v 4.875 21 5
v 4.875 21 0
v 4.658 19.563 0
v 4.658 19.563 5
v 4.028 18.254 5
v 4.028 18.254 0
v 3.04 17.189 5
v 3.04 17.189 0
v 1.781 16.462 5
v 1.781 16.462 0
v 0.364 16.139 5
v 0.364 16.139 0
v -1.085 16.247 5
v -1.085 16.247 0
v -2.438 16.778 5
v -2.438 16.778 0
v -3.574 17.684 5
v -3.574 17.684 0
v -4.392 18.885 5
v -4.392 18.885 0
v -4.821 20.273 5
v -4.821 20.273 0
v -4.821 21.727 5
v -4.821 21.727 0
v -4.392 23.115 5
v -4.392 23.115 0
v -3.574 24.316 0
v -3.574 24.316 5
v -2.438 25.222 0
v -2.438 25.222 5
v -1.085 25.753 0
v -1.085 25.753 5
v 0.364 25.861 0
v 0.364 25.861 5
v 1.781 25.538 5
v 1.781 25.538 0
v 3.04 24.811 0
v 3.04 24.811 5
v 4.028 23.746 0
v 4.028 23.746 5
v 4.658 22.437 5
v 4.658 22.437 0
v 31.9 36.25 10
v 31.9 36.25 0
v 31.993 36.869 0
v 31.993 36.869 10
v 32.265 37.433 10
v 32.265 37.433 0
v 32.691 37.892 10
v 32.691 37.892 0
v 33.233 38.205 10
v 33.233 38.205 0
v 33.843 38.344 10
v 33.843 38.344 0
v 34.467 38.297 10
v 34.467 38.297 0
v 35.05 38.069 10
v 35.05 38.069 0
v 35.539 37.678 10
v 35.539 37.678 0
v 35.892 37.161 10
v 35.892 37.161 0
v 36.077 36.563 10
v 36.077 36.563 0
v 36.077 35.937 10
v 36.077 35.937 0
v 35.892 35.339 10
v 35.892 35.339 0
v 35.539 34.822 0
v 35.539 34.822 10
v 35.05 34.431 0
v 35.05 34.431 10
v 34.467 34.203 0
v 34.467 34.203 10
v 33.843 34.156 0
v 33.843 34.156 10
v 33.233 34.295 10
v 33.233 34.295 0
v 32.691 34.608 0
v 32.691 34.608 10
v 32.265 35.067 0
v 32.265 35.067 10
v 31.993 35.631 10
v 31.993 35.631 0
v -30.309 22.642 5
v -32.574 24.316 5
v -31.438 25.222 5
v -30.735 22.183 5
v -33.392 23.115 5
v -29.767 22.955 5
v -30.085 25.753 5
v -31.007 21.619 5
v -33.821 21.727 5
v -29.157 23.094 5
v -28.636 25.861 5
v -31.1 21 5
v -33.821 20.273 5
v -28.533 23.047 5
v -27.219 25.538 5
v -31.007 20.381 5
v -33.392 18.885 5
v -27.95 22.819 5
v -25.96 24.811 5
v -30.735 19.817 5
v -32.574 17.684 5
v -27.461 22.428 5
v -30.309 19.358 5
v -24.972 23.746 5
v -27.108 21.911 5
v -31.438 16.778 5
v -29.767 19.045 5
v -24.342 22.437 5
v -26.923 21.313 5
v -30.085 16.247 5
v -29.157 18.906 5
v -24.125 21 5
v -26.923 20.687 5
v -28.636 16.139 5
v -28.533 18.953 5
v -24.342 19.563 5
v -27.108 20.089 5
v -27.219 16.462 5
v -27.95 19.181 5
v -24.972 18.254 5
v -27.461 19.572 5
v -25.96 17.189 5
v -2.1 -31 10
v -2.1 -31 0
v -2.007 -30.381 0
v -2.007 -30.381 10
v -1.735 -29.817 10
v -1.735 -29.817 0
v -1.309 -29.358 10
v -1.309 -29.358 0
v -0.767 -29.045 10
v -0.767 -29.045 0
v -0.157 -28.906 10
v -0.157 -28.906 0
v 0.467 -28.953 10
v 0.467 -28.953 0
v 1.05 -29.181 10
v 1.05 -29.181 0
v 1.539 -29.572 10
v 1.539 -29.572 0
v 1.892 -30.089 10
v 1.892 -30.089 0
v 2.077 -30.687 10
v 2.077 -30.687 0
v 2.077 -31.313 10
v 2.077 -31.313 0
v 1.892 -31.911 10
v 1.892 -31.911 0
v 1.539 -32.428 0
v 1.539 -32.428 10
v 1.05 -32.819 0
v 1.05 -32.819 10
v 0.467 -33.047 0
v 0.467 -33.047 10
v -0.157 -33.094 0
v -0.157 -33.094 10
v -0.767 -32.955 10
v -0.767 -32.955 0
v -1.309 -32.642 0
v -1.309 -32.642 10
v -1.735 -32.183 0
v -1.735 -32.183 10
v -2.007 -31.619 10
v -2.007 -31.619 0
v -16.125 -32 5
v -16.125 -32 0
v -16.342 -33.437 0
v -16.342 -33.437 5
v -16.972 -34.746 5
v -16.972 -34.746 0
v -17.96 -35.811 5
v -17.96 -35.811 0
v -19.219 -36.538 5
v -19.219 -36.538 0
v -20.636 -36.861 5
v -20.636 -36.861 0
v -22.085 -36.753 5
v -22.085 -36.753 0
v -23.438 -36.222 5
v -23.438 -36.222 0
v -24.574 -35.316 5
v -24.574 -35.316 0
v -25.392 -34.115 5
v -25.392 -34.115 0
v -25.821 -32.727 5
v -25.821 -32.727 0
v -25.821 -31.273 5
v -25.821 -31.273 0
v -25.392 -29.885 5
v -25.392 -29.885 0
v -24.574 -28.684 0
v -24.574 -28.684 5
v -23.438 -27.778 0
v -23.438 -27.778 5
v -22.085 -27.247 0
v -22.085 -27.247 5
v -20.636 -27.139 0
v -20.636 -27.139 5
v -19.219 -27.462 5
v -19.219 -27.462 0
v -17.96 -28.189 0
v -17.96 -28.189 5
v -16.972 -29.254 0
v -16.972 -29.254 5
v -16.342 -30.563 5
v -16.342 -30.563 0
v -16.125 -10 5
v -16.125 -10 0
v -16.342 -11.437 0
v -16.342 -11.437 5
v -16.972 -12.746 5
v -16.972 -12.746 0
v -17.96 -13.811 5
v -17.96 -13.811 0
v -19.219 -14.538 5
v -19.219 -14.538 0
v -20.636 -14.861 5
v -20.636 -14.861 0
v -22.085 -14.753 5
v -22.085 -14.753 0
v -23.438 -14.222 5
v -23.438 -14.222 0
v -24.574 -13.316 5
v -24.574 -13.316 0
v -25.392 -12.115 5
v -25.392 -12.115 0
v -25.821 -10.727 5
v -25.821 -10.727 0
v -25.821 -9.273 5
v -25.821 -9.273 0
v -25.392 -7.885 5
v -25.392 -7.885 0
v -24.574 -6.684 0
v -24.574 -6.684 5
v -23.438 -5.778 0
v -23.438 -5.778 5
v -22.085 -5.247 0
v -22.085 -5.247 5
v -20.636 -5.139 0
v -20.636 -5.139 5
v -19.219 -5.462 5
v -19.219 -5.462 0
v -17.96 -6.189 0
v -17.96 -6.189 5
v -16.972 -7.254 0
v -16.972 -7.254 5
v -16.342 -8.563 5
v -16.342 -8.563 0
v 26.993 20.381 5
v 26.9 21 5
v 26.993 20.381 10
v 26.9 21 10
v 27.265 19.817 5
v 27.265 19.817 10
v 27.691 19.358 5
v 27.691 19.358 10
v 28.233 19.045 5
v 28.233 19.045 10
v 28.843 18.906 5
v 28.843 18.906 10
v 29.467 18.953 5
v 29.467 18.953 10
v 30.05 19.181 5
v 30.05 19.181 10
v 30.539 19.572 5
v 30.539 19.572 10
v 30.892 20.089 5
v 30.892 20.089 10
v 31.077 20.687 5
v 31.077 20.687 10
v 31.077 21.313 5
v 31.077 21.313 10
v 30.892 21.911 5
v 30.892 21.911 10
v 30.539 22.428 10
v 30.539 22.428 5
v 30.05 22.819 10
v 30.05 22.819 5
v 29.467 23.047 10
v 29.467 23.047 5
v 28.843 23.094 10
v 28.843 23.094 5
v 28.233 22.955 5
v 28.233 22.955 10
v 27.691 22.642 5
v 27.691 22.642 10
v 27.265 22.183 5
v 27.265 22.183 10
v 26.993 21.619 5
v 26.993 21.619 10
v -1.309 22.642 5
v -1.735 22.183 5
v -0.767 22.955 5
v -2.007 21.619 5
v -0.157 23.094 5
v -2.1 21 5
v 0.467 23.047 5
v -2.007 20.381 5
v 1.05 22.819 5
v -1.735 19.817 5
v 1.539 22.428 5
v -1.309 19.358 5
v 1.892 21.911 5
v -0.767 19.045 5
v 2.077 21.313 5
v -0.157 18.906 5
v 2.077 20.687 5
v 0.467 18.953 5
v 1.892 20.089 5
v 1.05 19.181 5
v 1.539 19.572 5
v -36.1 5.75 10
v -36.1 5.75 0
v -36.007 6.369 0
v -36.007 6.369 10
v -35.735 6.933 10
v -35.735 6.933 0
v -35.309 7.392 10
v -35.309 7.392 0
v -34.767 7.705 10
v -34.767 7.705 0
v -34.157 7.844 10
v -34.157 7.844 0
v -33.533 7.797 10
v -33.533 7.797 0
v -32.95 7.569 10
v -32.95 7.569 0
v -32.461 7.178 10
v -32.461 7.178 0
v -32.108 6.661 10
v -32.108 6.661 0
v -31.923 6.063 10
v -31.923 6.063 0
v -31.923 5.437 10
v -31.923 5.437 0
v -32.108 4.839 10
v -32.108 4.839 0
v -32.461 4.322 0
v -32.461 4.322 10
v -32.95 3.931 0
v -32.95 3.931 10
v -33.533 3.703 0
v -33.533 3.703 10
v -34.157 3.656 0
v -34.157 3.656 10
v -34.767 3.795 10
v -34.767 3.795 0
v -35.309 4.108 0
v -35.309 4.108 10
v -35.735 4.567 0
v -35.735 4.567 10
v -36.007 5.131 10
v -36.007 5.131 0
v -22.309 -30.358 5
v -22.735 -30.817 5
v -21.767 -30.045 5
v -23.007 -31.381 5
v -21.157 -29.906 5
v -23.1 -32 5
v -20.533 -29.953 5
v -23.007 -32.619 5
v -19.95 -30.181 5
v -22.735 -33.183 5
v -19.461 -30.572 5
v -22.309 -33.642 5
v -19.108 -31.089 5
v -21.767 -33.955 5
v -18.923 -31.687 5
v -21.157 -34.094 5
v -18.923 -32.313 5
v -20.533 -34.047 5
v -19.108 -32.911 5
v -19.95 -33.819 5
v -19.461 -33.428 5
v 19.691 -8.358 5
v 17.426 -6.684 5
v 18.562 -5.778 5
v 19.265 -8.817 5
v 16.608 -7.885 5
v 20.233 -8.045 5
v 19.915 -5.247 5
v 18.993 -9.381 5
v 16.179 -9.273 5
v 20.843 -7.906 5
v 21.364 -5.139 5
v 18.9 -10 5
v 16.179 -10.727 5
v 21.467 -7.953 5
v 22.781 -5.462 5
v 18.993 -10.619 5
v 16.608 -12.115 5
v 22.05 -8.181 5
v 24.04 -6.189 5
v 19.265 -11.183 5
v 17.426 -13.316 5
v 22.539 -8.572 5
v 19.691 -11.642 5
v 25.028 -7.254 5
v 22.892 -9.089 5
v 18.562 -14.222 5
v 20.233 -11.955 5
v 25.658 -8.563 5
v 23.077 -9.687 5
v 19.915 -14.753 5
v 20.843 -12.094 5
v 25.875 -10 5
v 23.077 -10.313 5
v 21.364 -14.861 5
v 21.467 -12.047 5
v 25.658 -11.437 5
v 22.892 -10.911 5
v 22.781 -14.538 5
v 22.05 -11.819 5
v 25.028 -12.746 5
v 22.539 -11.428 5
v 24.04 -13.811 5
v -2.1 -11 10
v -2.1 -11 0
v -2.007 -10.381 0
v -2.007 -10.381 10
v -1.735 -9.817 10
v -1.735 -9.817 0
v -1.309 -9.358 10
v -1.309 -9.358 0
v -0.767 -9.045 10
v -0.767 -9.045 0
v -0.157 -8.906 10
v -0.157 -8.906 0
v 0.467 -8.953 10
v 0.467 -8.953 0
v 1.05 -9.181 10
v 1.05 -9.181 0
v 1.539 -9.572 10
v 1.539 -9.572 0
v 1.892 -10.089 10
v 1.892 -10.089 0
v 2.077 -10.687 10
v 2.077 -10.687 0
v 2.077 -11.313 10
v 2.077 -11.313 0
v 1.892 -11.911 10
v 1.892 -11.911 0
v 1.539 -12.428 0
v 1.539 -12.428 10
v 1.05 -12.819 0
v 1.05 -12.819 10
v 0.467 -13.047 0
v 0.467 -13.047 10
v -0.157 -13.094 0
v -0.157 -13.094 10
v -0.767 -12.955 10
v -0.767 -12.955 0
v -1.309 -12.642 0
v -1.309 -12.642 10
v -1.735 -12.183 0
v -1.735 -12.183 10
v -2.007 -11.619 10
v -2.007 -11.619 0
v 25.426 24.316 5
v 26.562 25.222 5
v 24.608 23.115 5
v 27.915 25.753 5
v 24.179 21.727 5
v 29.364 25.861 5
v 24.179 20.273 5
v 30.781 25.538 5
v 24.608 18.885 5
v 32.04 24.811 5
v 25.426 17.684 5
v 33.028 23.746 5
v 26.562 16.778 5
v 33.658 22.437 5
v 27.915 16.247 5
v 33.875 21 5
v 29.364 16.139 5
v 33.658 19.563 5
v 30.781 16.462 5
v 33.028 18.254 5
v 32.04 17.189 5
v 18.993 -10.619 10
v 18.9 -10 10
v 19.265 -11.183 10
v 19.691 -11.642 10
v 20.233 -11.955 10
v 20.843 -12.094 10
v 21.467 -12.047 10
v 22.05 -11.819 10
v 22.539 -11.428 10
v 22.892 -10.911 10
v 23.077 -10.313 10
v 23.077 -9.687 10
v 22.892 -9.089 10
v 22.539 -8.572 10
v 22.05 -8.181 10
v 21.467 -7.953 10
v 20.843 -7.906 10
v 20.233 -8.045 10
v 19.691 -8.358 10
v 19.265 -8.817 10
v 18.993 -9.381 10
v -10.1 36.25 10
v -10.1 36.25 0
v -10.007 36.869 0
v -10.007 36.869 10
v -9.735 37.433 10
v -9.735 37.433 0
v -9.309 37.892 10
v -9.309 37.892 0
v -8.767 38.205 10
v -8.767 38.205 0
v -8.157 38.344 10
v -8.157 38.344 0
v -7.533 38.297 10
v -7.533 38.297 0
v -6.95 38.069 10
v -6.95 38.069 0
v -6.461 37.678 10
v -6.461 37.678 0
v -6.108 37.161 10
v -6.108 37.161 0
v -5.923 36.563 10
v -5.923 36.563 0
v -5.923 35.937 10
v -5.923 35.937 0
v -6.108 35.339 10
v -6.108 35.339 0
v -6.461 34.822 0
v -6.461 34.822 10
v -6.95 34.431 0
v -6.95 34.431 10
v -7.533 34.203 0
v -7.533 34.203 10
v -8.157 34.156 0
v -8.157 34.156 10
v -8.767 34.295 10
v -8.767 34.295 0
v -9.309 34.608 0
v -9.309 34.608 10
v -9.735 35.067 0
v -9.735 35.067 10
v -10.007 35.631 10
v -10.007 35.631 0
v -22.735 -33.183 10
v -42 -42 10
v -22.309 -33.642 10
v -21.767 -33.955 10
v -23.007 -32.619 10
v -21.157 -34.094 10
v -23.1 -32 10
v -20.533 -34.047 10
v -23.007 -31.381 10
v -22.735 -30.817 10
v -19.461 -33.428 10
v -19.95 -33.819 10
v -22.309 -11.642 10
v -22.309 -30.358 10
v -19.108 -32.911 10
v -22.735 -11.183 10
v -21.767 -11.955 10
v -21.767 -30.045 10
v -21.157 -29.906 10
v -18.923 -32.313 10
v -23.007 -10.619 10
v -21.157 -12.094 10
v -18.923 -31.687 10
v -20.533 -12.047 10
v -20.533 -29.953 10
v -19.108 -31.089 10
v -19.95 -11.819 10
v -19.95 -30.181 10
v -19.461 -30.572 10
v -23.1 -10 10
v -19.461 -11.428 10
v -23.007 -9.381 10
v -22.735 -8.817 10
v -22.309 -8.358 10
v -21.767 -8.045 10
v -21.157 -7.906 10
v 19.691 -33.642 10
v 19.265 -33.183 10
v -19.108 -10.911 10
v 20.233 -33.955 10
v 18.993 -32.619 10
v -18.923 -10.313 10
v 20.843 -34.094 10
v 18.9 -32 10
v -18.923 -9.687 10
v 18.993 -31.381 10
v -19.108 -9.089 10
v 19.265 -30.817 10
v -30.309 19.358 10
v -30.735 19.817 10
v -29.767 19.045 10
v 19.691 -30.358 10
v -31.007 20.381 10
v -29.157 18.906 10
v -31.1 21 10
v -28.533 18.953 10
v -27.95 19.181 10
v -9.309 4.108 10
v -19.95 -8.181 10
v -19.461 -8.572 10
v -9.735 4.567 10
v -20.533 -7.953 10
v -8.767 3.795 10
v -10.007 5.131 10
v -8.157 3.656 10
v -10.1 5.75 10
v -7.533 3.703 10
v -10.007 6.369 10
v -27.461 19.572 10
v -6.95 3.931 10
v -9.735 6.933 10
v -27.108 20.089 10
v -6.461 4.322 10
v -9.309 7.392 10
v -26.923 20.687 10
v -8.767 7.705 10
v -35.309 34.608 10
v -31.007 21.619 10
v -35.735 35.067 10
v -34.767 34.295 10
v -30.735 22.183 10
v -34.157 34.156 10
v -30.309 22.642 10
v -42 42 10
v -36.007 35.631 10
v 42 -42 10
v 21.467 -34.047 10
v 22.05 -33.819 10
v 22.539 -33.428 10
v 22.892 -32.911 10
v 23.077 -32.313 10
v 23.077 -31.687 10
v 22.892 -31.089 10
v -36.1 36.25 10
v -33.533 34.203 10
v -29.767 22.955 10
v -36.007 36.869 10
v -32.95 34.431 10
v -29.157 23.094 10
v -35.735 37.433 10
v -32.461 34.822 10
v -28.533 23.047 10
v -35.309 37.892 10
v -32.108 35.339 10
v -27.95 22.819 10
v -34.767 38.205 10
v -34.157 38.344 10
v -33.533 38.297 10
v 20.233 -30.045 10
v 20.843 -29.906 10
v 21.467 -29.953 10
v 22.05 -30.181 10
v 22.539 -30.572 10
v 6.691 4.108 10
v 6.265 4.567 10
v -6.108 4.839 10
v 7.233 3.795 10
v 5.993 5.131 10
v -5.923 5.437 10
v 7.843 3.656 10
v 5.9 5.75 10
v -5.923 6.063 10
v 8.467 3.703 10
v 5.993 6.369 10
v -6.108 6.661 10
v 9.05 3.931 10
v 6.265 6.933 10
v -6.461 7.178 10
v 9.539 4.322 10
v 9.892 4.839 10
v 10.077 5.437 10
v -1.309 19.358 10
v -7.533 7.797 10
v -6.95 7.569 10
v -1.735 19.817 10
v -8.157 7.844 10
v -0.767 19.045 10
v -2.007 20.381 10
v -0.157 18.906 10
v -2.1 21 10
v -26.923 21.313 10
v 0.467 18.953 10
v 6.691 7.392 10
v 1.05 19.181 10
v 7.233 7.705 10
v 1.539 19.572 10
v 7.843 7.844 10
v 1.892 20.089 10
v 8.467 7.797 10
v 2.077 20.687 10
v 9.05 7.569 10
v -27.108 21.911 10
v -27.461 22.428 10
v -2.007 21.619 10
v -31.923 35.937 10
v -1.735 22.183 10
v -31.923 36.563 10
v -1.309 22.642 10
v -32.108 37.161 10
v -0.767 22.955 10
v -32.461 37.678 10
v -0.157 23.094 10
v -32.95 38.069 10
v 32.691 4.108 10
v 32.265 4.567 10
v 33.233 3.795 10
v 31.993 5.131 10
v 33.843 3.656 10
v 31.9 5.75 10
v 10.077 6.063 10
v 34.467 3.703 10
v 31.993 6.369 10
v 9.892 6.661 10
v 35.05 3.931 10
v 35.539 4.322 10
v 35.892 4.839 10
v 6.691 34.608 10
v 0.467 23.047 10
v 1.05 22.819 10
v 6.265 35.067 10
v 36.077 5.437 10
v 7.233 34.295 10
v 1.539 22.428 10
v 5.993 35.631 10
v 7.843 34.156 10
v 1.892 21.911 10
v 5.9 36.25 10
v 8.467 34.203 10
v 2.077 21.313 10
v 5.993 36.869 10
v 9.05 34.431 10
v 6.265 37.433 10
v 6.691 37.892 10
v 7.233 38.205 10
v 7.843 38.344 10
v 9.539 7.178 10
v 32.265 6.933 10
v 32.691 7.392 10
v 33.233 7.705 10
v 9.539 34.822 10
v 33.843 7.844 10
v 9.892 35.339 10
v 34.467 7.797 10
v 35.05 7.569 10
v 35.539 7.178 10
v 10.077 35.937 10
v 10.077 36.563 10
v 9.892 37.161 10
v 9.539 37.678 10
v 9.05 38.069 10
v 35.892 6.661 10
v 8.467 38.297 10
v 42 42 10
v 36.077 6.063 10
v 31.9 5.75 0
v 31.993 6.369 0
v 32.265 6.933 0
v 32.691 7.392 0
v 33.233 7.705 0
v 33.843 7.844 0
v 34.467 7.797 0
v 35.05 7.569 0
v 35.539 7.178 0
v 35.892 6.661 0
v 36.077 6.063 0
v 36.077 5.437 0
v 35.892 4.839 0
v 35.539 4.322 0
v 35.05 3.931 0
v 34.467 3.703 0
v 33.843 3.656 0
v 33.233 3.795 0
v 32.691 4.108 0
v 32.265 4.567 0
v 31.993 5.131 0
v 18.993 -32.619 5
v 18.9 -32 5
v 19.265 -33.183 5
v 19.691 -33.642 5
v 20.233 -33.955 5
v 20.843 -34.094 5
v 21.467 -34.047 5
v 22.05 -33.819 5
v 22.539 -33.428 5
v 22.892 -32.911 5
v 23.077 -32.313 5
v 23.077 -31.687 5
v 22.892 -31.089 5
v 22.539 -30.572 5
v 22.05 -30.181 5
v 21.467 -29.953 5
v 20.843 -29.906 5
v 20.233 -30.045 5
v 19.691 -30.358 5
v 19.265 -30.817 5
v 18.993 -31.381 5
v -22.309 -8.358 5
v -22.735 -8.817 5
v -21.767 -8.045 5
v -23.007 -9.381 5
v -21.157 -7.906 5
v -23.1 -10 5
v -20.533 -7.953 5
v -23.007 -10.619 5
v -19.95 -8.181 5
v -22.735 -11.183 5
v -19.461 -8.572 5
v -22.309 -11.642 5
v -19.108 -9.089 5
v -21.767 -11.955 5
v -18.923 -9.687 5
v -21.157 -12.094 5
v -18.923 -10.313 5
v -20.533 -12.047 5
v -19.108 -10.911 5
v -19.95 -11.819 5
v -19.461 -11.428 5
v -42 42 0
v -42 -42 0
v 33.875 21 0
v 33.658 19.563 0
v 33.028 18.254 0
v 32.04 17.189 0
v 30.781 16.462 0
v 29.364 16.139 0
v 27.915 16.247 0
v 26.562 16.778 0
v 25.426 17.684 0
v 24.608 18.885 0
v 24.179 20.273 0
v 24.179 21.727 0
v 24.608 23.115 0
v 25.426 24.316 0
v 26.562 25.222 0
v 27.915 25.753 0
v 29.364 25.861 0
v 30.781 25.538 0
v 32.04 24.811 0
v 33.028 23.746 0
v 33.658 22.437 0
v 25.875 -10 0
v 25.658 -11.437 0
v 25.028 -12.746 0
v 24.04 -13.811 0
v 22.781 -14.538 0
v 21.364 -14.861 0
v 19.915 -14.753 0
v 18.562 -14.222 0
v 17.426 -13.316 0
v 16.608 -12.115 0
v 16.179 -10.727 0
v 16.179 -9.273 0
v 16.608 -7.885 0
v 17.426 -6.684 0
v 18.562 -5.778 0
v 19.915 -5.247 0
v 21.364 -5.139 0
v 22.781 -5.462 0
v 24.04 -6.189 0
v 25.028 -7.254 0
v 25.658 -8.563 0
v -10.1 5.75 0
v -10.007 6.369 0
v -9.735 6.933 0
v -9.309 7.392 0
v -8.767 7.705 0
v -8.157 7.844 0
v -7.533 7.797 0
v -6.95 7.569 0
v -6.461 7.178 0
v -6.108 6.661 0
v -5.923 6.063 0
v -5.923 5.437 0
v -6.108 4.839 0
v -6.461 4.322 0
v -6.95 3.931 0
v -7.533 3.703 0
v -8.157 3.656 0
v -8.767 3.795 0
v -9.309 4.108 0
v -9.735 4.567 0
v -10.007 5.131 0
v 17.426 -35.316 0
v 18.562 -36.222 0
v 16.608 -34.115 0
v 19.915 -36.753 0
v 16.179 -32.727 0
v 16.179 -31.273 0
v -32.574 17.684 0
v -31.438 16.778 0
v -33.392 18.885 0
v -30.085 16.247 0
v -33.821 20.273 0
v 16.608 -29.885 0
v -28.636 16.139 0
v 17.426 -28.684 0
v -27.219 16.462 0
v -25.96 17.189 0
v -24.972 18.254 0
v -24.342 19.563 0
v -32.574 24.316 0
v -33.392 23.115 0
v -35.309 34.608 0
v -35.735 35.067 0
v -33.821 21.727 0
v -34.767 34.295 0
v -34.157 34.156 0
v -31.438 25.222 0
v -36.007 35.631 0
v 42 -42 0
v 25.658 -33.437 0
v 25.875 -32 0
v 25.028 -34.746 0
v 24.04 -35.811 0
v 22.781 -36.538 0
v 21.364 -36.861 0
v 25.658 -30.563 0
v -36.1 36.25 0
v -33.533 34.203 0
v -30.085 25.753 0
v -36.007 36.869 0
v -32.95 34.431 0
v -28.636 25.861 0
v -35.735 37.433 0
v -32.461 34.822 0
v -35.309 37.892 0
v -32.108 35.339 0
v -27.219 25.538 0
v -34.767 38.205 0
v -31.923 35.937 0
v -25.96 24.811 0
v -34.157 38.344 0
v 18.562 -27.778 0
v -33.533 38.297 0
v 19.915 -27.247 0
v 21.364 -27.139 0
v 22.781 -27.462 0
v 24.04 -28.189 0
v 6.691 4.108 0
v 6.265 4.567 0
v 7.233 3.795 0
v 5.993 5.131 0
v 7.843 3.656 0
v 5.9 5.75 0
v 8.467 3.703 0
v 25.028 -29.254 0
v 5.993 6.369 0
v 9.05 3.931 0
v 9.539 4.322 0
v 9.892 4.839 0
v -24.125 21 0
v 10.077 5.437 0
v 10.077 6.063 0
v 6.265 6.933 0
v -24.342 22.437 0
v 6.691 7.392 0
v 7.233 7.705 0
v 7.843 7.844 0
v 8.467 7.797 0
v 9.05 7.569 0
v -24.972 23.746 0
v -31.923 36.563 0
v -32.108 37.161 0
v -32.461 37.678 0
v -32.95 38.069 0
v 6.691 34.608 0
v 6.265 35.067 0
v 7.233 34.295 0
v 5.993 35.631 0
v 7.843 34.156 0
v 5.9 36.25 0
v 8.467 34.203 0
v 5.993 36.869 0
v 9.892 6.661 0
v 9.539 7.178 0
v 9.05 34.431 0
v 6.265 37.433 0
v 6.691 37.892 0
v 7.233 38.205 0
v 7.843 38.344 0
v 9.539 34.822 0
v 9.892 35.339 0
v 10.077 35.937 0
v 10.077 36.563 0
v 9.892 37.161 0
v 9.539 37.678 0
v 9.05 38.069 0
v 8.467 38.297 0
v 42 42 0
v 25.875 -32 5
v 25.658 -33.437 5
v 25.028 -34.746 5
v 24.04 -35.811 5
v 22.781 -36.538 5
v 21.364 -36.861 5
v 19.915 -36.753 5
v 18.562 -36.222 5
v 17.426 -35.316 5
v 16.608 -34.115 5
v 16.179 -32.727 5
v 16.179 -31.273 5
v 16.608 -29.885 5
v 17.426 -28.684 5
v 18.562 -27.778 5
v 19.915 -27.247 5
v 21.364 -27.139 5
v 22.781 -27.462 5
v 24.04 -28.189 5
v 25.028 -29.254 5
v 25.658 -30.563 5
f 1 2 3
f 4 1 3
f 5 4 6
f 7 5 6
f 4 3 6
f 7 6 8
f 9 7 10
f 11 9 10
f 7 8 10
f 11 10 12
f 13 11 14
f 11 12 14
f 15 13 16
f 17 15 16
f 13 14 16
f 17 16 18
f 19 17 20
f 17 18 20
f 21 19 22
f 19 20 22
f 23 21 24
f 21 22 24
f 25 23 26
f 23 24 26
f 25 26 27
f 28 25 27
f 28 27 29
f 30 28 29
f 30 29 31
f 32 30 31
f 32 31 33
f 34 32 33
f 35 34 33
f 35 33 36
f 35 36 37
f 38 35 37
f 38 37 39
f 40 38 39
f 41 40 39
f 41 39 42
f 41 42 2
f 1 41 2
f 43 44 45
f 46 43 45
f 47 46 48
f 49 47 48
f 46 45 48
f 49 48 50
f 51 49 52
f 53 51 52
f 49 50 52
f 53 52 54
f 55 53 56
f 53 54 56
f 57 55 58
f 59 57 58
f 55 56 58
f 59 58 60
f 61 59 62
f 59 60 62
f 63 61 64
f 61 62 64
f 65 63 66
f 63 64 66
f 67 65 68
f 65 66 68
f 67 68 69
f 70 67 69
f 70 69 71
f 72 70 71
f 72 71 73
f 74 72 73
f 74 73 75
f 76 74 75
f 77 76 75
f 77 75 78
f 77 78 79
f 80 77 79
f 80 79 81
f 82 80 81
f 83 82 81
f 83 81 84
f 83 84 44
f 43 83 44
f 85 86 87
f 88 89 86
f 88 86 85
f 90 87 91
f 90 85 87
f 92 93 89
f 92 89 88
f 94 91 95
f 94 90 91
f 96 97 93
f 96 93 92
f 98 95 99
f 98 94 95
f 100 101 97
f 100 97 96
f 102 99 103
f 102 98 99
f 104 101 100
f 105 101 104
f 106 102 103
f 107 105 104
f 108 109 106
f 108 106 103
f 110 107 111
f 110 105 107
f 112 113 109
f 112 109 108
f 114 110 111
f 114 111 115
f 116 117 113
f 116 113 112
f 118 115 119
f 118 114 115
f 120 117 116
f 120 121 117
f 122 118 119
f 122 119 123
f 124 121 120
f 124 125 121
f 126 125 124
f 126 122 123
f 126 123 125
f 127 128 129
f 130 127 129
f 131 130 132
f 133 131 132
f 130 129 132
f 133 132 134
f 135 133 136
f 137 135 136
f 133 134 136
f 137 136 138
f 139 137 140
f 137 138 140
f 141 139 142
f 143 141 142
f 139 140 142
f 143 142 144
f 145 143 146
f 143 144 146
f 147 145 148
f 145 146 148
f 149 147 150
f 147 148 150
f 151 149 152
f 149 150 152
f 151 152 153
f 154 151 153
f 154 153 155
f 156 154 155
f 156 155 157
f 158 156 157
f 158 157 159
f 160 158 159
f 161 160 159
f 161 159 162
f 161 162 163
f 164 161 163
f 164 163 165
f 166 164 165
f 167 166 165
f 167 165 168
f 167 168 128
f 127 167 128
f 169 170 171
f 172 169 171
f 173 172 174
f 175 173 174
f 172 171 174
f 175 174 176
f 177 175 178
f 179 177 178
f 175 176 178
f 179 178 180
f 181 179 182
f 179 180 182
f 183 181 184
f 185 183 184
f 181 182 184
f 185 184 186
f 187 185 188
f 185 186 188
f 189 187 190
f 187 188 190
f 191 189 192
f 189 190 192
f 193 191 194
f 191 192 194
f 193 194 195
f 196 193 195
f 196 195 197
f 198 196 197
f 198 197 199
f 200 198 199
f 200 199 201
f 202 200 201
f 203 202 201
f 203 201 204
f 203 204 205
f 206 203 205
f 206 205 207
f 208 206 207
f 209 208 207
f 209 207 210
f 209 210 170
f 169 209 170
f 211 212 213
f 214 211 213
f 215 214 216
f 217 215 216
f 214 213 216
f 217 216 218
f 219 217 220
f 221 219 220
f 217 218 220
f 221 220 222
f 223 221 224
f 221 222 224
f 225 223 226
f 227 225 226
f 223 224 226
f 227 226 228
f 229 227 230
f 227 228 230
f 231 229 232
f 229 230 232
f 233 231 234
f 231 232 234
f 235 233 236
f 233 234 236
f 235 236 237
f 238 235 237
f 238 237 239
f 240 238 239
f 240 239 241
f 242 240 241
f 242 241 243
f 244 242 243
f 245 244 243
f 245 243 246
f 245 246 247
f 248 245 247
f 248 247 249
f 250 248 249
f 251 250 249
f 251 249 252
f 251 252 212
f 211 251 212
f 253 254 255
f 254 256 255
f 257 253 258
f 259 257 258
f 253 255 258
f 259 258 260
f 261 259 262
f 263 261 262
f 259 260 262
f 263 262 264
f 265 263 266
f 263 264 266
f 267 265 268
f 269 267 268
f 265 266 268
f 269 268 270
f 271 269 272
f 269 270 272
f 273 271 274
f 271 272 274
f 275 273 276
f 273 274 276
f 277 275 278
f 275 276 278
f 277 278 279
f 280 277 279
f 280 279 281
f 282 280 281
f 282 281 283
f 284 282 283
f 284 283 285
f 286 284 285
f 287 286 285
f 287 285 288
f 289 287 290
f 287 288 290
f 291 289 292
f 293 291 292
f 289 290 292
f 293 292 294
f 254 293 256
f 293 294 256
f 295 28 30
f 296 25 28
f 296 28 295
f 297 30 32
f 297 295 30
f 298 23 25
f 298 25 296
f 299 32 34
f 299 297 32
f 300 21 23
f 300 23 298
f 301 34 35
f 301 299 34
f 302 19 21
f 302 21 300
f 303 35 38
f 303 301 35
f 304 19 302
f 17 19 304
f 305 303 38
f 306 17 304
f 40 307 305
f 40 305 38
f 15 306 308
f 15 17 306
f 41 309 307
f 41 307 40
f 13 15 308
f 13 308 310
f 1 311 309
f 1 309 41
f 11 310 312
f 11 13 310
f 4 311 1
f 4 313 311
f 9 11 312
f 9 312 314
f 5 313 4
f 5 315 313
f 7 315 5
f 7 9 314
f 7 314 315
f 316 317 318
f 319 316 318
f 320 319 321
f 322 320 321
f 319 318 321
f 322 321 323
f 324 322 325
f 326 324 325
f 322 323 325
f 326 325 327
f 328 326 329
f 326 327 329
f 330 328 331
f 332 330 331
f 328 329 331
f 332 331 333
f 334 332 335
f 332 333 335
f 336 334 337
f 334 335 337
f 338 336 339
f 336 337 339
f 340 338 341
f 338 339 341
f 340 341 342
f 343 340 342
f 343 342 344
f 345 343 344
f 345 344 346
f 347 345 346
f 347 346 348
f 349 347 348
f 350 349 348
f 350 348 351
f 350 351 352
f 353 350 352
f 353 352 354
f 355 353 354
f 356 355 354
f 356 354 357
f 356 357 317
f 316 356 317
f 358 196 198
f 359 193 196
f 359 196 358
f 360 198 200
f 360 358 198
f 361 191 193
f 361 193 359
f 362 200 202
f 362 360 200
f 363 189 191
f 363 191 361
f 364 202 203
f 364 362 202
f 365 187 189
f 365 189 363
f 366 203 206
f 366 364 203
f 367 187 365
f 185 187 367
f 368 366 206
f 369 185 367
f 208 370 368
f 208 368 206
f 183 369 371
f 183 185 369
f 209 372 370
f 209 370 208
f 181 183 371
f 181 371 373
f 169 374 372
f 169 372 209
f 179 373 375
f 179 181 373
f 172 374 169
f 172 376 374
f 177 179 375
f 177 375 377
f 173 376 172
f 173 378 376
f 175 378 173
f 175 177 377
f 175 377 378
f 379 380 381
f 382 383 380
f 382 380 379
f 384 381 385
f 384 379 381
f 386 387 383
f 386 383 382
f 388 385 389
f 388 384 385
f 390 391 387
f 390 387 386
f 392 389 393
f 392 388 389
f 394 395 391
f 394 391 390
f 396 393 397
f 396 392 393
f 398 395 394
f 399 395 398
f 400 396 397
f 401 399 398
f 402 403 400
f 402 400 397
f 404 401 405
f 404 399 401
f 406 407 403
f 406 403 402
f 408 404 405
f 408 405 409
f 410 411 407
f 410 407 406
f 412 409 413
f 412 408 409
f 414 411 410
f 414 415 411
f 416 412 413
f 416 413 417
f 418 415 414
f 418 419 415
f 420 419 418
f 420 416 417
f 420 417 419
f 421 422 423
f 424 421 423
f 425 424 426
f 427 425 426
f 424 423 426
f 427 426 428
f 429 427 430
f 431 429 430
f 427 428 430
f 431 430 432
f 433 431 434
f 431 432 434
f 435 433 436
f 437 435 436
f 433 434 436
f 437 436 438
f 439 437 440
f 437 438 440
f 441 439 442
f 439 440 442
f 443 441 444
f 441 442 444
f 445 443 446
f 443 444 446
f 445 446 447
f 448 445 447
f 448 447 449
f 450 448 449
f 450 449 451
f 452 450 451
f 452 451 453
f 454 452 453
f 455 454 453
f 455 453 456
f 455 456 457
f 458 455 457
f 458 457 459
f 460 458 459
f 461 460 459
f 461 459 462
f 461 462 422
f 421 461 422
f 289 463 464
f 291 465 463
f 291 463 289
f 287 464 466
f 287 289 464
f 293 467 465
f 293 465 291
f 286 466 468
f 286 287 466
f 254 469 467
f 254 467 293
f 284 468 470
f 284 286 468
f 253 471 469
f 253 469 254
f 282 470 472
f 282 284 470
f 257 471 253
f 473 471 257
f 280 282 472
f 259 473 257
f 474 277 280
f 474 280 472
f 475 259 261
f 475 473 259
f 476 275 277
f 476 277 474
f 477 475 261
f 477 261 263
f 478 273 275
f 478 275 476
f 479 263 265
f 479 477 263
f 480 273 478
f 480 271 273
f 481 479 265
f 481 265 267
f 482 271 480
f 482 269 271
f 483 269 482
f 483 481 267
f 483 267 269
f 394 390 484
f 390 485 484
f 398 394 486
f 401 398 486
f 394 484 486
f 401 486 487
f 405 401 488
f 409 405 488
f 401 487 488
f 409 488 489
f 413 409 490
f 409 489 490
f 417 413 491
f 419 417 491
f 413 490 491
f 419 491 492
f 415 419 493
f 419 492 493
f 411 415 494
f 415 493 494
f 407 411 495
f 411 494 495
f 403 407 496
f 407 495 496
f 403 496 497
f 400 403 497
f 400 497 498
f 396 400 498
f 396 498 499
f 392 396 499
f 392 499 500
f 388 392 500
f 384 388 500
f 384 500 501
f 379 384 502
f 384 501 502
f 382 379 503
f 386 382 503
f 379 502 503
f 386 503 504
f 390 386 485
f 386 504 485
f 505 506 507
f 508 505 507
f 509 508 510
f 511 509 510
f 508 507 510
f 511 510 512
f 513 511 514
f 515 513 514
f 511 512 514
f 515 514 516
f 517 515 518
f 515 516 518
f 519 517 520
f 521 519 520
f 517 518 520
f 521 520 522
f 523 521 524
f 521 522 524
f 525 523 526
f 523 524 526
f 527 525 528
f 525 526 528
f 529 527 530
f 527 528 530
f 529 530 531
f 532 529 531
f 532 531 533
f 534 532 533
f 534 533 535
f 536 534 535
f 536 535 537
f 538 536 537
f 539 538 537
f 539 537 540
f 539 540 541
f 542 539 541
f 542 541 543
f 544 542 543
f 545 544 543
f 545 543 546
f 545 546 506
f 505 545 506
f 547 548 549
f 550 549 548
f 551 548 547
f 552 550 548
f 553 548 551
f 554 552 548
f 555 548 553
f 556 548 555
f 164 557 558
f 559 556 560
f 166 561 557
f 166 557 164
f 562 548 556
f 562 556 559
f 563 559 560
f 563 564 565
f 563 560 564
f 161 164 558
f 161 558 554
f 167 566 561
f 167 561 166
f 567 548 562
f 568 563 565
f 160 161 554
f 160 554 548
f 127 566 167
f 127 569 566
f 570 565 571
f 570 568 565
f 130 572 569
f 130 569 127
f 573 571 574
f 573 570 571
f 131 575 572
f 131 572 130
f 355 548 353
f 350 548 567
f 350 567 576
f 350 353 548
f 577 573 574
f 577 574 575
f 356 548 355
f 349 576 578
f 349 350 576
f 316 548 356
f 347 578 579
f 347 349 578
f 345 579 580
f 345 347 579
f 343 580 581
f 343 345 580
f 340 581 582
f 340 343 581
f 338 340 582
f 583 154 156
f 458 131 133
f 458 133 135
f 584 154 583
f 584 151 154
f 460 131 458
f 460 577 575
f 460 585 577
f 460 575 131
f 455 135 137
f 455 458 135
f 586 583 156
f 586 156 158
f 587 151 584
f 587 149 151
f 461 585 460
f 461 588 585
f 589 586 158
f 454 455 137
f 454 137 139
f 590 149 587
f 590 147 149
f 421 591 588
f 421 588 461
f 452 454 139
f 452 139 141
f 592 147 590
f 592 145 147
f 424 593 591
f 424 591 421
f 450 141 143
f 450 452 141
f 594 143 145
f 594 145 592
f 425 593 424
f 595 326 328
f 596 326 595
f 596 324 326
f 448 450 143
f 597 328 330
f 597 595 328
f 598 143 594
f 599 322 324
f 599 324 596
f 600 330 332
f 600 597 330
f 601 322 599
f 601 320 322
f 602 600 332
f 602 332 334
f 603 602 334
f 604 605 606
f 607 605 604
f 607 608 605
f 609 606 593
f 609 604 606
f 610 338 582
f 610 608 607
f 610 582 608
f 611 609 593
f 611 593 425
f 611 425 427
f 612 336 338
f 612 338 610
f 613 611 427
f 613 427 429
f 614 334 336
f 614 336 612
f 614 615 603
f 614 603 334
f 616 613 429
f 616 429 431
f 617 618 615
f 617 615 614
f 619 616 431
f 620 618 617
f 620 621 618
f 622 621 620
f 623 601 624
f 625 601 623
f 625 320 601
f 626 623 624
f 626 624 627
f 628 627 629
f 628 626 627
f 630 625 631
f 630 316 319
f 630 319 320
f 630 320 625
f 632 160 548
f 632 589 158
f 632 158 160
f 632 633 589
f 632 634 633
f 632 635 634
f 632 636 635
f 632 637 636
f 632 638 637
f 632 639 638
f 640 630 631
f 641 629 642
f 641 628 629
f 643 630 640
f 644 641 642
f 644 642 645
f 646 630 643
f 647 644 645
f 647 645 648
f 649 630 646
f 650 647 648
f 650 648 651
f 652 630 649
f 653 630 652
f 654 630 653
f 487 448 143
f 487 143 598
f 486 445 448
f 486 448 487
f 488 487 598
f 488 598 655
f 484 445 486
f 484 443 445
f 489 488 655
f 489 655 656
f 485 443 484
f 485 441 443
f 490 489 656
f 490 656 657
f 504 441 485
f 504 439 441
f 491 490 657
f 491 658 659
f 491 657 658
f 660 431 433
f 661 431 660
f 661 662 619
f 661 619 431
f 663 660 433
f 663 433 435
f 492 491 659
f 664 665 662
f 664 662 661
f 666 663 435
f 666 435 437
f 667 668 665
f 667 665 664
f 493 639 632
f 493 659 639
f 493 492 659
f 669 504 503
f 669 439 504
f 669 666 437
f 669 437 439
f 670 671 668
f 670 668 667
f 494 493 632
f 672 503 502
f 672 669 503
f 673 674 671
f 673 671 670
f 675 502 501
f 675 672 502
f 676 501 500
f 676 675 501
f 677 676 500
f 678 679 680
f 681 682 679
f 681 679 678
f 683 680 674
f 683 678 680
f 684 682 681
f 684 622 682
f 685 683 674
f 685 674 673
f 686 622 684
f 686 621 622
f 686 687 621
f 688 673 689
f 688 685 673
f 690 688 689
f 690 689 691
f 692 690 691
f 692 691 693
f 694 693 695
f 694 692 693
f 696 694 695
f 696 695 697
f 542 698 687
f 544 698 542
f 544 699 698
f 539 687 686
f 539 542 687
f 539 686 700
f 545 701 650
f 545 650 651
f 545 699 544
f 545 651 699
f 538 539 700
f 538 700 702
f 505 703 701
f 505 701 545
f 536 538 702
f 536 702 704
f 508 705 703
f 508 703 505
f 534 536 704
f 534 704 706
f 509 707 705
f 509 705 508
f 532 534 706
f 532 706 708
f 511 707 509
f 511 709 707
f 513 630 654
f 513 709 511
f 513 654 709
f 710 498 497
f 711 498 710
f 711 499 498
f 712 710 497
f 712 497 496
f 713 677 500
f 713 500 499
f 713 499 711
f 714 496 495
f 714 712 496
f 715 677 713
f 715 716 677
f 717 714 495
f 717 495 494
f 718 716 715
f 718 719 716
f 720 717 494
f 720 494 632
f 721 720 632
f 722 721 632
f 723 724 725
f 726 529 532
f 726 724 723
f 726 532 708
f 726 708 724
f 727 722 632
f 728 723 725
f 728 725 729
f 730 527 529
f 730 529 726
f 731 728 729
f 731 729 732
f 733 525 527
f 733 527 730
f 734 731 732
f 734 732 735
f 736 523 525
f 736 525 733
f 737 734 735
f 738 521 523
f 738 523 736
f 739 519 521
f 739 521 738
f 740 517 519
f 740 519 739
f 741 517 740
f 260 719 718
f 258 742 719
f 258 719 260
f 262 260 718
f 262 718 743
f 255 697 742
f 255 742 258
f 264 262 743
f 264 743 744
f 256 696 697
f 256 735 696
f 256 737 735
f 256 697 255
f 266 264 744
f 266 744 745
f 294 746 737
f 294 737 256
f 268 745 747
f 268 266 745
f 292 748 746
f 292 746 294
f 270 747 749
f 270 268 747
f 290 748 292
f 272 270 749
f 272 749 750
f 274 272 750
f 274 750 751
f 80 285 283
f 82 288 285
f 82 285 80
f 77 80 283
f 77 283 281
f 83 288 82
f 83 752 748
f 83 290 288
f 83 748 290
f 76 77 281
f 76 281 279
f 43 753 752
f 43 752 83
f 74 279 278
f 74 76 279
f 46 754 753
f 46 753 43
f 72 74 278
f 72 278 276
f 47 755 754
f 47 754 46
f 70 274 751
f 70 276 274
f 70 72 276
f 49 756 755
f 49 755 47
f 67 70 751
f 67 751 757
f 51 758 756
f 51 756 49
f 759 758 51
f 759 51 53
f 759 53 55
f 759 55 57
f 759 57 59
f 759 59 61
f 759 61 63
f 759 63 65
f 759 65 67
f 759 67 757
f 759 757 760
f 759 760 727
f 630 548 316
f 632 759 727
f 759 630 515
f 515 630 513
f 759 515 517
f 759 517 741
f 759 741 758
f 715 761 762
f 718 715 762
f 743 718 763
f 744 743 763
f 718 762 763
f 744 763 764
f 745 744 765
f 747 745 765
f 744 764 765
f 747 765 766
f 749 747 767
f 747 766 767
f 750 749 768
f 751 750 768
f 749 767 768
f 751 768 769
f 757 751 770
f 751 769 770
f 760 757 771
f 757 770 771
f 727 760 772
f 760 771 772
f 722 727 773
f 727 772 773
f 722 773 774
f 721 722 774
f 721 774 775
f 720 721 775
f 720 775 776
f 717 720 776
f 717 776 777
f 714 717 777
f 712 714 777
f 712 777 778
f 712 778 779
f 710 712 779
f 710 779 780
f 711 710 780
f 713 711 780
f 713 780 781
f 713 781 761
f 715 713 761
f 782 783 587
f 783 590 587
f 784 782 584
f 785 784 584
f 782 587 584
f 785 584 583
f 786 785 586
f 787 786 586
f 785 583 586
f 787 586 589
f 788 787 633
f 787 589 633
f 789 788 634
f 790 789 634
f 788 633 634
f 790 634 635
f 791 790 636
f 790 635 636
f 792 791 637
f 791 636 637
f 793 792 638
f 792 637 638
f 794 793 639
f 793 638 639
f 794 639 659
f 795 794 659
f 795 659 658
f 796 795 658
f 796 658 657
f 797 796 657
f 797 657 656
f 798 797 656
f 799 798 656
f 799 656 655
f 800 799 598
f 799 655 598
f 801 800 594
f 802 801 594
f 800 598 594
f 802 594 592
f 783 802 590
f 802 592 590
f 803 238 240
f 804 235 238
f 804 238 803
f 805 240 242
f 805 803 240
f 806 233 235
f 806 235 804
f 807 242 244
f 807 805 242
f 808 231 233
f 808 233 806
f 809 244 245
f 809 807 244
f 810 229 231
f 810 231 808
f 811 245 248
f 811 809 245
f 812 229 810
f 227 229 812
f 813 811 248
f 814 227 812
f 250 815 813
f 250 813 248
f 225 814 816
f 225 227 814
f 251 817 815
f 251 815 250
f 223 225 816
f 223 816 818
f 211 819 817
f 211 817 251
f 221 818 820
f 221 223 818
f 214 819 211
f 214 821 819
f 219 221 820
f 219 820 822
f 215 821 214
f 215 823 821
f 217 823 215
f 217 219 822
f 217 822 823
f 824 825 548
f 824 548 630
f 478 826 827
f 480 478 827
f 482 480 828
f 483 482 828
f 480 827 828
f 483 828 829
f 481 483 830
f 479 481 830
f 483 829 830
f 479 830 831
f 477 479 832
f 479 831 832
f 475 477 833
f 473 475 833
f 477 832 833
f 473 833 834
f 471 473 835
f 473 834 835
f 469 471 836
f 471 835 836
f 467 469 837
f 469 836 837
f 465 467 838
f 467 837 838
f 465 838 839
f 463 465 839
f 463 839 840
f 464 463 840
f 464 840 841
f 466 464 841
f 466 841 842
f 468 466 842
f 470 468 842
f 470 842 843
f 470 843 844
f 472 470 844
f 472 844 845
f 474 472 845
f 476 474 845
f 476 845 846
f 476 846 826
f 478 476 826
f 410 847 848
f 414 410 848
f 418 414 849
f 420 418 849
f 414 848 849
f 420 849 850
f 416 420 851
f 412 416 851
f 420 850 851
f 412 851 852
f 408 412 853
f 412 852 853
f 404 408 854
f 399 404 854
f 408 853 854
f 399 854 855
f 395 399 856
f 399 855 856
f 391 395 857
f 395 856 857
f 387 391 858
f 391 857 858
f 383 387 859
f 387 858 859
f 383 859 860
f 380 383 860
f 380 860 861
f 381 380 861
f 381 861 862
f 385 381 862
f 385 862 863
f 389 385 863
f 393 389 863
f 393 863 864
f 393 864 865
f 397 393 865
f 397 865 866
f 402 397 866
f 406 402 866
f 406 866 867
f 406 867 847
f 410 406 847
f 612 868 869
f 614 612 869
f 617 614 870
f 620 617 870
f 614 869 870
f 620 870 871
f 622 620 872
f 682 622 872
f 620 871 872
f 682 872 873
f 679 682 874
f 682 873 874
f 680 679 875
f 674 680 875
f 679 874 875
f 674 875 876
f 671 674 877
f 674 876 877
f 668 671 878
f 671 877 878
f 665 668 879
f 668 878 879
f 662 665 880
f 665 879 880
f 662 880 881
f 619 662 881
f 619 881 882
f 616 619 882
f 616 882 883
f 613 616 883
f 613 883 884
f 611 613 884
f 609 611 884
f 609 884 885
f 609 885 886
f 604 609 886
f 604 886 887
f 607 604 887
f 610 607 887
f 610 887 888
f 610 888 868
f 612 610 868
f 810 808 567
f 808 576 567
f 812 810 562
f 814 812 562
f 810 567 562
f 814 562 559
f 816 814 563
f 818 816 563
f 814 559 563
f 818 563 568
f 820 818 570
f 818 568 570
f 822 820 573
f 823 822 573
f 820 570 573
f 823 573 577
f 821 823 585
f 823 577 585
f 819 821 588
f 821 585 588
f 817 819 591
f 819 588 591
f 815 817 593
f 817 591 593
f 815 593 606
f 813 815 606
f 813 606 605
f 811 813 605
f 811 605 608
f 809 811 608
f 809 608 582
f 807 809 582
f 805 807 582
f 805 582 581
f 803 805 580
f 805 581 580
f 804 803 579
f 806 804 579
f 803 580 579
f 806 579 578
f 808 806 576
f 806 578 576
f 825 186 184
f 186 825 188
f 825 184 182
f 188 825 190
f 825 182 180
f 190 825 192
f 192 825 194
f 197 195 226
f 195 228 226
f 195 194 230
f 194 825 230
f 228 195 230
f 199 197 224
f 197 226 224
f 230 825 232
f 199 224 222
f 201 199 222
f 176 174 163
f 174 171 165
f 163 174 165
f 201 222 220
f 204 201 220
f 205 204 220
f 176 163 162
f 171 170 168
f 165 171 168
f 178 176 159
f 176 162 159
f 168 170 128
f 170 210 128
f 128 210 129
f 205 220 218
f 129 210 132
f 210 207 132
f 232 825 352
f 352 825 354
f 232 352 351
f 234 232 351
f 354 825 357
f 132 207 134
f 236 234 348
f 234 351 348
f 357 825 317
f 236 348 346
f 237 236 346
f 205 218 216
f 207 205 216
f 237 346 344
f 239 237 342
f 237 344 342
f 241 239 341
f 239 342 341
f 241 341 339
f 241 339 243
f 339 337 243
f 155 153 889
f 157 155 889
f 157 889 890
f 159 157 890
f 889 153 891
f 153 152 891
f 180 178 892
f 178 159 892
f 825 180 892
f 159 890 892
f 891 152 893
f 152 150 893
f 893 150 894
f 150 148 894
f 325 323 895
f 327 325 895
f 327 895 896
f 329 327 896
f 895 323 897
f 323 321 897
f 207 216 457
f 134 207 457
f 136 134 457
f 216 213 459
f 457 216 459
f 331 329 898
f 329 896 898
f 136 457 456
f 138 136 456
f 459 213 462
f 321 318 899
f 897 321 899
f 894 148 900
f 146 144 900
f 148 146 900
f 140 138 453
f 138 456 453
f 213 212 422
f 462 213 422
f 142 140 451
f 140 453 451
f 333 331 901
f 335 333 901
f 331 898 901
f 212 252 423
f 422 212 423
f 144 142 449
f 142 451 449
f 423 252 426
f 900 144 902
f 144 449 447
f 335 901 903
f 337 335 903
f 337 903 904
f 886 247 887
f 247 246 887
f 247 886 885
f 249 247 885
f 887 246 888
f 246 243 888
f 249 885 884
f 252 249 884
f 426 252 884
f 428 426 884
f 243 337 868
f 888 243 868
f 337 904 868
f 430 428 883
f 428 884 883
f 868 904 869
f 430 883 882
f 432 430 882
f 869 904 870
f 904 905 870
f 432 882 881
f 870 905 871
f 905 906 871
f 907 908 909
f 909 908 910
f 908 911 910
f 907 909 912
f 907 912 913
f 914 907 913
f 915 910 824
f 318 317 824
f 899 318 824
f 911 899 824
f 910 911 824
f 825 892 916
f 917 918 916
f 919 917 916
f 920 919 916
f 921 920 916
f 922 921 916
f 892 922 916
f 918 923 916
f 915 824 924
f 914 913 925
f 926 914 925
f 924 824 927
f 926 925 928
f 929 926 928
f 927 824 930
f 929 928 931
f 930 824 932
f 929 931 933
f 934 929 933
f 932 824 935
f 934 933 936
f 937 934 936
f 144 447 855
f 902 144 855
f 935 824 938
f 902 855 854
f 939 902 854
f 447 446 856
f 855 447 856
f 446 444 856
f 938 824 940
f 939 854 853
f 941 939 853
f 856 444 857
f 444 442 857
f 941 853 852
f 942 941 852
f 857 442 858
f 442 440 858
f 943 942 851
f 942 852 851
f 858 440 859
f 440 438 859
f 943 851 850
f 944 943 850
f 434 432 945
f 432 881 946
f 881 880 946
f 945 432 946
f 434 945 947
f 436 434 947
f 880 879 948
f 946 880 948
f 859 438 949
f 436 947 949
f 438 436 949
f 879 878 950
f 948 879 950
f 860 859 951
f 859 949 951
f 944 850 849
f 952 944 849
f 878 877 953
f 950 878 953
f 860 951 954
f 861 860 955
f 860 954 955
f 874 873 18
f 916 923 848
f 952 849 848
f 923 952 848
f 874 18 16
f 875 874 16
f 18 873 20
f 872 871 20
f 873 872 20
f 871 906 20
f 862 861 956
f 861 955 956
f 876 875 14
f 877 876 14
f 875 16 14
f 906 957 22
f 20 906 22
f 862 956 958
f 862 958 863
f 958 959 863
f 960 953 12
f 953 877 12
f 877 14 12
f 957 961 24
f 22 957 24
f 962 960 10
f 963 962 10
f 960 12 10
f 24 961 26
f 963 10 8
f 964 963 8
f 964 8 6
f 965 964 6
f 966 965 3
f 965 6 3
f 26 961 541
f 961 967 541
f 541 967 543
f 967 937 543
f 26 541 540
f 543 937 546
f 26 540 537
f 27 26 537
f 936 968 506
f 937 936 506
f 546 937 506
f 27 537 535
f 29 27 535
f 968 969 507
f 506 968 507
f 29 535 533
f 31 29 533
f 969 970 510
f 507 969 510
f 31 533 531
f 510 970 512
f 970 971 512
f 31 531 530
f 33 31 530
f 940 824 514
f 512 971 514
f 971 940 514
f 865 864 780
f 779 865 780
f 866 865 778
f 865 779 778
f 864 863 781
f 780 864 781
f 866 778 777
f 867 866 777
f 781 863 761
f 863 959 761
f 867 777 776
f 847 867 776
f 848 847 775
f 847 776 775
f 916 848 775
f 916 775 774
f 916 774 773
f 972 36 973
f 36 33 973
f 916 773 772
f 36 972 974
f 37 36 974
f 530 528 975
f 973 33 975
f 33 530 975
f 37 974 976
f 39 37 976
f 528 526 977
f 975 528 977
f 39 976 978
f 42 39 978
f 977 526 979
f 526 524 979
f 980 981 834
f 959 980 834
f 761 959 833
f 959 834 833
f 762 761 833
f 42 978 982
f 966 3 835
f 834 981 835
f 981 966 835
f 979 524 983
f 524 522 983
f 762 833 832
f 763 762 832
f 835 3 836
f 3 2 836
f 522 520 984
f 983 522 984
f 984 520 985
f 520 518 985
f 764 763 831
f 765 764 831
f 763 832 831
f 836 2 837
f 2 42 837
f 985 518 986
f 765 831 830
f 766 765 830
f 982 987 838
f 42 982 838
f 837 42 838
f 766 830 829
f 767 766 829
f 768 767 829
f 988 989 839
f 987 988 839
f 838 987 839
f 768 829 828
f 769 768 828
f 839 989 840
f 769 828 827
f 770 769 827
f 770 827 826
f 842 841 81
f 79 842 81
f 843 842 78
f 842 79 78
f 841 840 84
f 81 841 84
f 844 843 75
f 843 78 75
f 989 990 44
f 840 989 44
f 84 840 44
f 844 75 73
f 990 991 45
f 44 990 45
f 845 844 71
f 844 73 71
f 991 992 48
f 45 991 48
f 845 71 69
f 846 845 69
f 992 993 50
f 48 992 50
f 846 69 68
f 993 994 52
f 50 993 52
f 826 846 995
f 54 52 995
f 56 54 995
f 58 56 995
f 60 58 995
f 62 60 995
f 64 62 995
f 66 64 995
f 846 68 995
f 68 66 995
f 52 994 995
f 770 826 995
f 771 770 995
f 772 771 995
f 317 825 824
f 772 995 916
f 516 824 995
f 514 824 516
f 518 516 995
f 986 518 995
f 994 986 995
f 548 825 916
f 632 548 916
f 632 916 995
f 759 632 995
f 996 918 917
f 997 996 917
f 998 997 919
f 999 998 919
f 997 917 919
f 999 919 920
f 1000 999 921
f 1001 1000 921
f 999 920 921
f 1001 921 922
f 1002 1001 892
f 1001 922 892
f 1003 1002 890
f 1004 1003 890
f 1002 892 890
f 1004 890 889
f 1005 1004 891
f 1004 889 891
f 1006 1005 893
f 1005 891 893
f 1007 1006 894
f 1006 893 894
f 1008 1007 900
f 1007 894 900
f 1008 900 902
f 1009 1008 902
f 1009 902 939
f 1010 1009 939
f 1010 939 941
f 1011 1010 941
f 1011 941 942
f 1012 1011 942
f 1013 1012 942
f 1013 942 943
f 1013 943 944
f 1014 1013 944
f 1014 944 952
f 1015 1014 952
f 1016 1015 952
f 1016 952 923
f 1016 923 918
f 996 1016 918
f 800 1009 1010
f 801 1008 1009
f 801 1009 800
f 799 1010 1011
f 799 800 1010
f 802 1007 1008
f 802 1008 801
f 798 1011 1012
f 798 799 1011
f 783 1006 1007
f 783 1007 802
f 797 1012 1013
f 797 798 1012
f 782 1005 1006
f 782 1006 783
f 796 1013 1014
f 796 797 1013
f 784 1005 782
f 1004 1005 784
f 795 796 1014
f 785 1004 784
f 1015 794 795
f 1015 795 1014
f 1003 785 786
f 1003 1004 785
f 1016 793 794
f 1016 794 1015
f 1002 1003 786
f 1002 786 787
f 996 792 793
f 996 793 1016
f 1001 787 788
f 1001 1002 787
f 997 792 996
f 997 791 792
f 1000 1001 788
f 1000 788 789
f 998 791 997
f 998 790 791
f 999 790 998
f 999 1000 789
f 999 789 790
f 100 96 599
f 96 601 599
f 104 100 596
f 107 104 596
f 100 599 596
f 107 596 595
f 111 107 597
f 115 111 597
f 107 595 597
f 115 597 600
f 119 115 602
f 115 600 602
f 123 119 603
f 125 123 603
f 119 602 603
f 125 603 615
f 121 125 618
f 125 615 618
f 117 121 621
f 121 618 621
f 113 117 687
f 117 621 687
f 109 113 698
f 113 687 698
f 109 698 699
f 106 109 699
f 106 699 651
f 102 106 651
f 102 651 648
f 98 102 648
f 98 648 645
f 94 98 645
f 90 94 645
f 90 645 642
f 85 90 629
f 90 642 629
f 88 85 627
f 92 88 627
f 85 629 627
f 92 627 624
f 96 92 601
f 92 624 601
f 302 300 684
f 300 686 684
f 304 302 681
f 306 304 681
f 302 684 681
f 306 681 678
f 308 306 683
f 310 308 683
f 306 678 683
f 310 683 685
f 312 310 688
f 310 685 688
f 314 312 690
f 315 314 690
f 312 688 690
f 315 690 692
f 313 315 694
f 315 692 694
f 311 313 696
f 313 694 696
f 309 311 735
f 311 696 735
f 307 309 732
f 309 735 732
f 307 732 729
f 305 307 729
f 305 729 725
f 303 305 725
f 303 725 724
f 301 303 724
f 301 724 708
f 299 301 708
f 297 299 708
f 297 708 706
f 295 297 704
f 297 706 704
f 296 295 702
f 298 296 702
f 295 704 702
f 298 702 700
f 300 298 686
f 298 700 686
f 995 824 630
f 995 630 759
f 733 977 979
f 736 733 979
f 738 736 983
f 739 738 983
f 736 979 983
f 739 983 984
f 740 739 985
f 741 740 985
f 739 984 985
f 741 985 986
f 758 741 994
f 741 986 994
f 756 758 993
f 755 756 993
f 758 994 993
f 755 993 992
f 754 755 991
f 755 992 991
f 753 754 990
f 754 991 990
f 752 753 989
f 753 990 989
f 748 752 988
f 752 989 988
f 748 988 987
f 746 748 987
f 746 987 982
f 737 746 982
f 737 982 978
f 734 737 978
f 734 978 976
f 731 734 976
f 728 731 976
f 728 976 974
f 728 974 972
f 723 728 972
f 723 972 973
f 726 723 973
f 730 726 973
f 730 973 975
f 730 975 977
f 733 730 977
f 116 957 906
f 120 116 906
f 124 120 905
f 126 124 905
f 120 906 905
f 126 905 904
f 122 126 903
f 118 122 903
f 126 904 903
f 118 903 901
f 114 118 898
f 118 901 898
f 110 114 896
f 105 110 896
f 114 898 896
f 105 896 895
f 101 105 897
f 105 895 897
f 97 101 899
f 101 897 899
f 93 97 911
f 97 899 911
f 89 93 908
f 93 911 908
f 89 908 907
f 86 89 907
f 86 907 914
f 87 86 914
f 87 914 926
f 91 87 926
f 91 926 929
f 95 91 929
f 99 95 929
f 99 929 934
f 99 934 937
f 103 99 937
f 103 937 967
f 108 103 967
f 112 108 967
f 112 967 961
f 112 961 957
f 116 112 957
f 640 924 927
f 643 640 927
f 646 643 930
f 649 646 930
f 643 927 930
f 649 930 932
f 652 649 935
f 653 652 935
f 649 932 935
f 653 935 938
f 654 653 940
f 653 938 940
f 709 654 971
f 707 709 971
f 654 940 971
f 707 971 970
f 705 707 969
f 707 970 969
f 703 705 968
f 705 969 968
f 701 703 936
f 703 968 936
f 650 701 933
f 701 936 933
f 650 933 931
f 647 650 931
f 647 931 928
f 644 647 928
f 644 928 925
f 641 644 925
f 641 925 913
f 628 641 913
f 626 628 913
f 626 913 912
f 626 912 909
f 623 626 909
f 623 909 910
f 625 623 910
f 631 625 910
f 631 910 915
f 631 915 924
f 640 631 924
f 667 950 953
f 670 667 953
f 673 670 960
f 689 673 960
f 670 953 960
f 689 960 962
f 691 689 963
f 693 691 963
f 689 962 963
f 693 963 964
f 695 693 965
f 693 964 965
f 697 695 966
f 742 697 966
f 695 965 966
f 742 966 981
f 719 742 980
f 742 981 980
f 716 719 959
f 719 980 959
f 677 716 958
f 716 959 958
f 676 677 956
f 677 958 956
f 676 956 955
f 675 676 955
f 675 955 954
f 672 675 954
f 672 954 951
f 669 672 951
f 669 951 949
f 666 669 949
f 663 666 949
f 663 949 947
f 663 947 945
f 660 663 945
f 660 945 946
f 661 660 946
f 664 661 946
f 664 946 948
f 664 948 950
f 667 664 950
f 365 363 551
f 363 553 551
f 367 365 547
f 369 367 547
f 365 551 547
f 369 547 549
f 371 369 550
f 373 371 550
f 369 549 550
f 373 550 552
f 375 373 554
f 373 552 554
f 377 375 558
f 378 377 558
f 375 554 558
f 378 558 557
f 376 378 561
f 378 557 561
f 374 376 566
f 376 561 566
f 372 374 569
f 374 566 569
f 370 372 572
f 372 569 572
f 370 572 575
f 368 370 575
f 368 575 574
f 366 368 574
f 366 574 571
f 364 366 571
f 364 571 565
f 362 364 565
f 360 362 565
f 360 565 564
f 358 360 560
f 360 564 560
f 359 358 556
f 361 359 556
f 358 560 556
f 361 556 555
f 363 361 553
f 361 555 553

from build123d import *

# Parameters (mm, degrees)
F0_W           = 84
F0_H           = 84
F1_DEPTH       = 10
F3_D           = 4.2
F5_D           = 4.2
F5_CBORE_D     = 9.75
F5_CBORE_DEPTH = 5


# Not quite as in the source:
# - a feature names something its author has since deleted; it is built from what else it names


with BuildPart() as f1:
    # F0 (on Top) → F1 (new body)
    with BuildSketch(Plane.XY):
        Rectangle(F0_W, F0_H)
    extrude(amount=F1_DEPTH)

    # F3 (through all)
    with Locations(Plane.XY.offset(10)):
        with Locations((-34, 36.25), (-8, 36.25), (8, 36.25), (34, 36.25), (34, 5.75), (8, 5.75), (-8, 5.75), (-34, 5.75), (0, -11), (0, -31)):
            Hole(F3_D / 2)

    # F5 (through all)
    with Locations(Plane(origin=(0, 0, 0), x_dir=(1, 0, 0), z_dir=(0, 0, -1))):
        with Locations((29, -21), (0, -21), (-29, -21), (21, 10), (21, 32), (-21, 32), (-21, 10)):
            CounterBoreHole(F5_D / 2, F5_CBORE_D / 2, F5_CBORE_DEPTH)


solid = f1.part
